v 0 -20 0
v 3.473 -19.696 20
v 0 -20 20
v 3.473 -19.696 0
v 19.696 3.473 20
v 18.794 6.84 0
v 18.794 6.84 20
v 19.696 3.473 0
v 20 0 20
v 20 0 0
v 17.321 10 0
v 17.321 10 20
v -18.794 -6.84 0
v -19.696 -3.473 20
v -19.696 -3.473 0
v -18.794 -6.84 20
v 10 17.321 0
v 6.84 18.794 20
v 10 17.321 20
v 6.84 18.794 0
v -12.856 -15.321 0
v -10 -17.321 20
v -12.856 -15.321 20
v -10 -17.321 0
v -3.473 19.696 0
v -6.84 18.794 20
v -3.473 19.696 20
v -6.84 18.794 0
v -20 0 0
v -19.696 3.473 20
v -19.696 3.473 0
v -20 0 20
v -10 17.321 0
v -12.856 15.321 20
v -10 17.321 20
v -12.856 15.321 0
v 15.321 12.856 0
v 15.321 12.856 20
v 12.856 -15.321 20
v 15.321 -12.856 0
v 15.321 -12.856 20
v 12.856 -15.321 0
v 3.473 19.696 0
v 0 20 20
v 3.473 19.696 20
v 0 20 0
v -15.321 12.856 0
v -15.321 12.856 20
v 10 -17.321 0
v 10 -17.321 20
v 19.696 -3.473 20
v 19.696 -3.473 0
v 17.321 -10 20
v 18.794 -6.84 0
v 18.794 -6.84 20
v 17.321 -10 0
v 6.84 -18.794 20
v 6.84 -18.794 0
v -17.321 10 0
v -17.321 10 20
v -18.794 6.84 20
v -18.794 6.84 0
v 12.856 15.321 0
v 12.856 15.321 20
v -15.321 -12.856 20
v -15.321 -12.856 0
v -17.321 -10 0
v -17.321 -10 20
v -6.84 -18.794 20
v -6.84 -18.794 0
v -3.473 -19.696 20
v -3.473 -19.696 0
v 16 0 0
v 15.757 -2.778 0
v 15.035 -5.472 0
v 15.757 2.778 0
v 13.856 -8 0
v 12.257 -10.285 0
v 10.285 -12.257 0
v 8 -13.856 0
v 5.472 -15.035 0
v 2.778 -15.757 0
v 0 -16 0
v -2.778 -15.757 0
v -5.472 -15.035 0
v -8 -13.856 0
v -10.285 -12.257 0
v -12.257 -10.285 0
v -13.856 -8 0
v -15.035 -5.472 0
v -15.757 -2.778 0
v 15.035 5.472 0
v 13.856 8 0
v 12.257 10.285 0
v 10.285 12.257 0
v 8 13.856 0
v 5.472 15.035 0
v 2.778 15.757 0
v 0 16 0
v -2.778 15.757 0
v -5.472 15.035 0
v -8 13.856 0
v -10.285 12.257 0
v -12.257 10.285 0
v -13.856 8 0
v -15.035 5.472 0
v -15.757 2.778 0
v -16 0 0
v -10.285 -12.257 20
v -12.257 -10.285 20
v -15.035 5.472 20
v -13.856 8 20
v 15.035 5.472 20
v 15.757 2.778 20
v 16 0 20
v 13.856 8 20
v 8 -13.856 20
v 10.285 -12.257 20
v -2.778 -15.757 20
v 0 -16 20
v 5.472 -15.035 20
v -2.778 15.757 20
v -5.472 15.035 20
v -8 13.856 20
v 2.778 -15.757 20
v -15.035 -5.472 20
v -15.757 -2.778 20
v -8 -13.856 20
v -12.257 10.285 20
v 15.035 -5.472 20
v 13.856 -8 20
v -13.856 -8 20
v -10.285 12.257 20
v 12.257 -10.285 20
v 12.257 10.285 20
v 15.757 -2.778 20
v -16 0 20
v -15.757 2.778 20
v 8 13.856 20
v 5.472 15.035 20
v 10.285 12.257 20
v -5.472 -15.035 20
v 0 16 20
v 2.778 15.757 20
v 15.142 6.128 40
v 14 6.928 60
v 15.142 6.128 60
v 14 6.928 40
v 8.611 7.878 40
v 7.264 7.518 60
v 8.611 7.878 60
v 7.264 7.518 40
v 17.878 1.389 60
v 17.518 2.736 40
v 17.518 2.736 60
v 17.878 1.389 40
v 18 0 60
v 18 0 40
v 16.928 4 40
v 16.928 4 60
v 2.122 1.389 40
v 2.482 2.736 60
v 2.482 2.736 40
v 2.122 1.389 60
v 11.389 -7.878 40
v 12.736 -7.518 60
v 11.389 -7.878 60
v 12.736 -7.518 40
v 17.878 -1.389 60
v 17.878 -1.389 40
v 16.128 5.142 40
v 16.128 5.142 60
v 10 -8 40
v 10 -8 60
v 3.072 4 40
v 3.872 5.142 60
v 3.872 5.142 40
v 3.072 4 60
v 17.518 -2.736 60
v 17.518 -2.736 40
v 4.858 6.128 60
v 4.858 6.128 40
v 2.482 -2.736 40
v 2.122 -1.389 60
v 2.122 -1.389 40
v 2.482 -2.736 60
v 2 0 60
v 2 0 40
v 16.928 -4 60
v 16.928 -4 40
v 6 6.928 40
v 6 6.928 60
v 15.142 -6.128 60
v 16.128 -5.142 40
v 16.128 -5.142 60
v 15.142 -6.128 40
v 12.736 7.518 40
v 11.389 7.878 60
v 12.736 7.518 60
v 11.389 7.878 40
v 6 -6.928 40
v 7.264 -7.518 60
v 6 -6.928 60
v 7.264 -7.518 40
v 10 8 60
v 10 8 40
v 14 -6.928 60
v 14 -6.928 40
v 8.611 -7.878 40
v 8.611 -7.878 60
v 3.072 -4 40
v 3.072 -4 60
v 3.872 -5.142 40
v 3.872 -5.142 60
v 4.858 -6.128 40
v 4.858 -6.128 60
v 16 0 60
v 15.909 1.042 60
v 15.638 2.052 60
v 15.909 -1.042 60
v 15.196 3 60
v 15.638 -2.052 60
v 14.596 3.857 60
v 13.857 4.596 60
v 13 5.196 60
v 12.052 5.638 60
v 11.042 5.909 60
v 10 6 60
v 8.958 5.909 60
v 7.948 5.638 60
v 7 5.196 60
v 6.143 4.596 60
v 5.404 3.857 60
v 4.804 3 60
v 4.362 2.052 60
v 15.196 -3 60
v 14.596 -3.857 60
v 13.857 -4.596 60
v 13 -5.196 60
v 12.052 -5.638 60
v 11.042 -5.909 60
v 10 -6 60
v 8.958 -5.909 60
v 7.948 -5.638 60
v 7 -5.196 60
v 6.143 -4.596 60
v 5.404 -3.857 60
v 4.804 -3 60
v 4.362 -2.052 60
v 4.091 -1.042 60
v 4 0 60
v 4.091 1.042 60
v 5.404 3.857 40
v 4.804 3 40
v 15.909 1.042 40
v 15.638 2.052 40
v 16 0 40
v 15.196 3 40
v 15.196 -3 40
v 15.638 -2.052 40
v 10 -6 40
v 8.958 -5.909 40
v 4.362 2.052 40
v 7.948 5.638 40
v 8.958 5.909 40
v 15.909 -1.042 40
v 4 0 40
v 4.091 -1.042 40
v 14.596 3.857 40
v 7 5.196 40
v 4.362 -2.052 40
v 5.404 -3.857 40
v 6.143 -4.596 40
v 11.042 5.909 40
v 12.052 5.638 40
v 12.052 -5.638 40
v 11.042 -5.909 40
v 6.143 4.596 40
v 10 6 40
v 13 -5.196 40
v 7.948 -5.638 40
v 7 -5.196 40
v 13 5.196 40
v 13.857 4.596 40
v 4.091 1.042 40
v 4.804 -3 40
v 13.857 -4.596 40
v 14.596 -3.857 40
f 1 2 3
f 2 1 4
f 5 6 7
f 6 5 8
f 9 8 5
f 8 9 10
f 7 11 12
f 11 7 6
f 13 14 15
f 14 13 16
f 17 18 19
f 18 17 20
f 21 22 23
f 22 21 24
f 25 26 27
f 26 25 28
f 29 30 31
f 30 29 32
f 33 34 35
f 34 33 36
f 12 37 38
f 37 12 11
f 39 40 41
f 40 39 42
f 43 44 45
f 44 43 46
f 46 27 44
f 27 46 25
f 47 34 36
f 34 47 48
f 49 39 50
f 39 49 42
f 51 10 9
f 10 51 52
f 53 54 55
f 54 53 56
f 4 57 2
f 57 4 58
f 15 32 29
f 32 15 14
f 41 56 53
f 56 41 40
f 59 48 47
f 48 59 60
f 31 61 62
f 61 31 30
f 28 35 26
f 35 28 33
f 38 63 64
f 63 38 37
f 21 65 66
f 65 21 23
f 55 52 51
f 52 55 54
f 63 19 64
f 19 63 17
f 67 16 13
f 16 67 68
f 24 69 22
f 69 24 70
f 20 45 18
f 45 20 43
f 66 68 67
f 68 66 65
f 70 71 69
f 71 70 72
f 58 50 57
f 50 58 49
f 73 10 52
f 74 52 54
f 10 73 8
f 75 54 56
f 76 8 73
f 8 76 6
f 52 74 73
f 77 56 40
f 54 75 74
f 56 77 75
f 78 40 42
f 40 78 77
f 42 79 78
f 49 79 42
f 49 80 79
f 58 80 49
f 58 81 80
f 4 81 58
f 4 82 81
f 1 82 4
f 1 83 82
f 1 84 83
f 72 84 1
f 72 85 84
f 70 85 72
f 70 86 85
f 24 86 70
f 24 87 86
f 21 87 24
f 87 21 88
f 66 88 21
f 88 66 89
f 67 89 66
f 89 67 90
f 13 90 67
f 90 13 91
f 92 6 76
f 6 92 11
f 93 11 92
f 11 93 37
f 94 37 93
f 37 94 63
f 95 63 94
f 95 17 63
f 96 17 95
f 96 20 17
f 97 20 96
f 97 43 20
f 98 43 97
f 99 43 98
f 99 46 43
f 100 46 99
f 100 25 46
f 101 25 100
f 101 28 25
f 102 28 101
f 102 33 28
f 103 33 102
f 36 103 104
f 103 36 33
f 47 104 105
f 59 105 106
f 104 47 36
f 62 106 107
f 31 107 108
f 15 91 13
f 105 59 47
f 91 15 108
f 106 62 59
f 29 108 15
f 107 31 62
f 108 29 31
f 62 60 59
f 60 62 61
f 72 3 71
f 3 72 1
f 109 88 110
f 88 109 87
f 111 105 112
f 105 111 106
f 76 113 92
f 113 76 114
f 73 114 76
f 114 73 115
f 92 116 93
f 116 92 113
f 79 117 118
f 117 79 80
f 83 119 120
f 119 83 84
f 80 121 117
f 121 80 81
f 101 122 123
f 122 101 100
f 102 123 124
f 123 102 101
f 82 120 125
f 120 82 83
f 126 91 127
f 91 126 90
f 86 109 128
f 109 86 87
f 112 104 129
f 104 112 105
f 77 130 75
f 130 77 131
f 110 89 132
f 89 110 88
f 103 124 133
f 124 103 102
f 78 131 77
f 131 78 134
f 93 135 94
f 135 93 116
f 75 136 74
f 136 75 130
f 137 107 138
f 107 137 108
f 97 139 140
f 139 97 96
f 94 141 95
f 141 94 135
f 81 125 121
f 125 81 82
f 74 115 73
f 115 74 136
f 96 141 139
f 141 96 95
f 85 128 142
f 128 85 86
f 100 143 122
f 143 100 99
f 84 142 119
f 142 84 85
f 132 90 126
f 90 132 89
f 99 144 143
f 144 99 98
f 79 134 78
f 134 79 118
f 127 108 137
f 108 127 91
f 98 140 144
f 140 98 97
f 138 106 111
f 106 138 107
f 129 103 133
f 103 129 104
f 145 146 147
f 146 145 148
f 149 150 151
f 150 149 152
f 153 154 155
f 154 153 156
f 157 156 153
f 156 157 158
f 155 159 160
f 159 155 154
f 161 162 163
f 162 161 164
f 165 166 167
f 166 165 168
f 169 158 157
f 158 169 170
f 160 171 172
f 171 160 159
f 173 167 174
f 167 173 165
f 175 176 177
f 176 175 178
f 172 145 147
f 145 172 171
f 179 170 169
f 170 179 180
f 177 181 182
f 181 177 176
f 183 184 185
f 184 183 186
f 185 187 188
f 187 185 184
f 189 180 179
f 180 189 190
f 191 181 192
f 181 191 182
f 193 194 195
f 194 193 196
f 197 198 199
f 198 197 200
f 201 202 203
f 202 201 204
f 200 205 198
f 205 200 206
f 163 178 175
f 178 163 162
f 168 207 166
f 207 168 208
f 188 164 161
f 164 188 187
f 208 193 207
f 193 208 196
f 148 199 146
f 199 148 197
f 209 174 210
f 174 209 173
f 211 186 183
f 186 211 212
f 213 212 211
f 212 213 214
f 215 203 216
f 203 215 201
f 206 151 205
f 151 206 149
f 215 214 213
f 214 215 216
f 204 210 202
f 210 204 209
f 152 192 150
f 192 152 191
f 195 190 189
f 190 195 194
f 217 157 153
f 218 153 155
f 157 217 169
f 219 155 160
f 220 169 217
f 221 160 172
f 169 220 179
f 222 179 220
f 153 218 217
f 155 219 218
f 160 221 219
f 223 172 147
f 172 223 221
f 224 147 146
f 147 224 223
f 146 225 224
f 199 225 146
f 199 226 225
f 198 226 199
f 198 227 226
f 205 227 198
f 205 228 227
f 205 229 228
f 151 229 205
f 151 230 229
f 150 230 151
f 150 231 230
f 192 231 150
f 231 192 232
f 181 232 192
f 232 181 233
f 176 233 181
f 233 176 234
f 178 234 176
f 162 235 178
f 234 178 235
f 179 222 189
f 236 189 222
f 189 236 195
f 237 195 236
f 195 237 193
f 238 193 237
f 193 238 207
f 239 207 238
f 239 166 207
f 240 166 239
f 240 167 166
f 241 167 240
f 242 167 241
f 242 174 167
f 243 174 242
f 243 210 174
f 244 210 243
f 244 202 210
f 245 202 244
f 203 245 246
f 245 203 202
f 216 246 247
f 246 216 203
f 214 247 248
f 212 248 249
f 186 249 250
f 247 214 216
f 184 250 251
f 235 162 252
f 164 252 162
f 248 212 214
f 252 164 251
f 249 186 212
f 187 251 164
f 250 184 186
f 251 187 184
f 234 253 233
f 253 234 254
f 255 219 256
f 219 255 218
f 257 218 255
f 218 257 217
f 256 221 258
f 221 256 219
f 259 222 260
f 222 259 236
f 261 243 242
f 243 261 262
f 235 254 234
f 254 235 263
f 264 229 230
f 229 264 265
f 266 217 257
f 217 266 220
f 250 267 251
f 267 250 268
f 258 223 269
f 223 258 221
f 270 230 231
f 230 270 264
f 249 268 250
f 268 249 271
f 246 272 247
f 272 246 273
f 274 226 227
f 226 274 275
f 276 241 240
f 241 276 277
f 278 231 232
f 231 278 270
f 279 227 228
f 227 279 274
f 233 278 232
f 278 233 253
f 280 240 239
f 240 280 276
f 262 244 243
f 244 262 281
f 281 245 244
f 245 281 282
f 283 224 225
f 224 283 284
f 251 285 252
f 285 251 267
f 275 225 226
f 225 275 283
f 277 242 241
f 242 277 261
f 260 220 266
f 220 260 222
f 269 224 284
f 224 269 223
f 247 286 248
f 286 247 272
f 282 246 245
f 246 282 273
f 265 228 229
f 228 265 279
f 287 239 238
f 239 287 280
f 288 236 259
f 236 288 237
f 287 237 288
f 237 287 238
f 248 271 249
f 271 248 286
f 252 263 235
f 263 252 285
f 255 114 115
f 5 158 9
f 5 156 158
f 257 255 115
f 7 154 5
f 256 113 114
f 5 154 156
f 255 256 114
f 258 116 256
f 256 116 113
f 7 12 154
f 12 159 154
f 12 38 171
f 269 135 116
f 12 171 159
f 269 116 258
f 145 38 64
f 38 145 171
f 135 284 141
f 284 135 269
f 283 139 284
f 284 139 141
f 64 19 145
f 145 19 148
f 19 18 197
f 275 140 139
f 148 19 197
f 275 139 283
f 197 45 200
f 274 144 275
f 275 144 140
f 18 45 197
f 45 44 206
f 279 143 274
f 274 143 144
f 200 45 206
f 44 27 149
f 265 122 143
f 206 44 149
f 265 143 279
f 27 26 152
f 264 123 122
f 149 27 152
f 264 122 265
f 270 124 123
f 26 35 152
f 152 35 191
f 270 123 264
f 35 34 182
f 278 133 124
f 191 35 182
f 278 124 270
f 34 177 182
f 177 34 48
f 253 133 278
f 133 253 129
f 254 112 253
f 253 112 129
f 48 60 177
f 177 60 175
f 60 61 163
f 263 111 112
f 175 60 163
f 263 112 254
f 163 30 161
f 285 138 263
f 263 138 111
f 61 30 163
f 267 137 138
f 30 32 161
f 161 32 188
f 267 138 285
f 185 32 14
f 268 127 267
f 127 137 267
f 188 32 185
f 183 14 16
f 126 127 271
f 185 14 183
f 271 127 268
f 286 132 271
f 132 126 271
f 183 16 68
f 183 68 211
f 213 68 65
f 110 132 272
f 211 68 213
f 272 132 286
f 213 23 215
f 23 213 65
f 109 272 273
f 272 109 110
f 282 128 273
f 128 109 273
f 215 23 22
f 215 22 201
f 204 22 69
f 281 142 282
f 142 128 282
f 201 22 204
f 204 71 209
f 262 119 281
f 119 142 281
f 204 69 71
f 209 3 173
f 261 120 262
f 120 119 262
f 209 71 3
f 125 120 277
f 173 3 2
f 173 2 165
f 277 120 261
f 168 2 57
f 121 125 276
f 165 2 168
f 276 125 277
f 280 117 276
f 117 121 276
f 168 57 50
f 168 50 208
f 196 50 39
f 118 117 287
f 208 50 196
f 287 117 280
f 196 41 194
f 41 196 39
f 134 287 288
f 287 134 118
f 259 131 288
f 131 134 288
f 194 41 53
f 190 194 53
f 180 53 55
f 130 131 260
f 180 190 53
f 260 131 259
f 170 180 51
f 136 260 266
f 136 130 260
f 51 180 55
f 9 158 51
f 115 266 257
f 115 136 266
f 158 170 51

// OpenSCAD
// eccentric pipe reducer
// by MisterC

// input parameters

/* lower pipe */
// lower pipe inner diameter
lower_diameter = 32; // min/max:[1:100]
// lower pipe height
lower_height = 20; // min/max:[1:100]
// lower pipe wall
lower_wall = 4; // min/max:[0.5:0.5:10]

/* transition piece */
// gap between lower and upper pipes
trans_height = 20; // min/max:[5:50]

// offset of reducer:
trans_angle = 0; // min/max:[0:360]
// angle (0=+X,90=+Y etc)
// ratio to cl
trans_ratio = 100; // min/max:[0:100]
// 0 ratio is concentric
// 100 ratio is wall parallel

// should inside walls run through?
in_parallel = true; // [true,false]
// true if inner wall would be parallel, false if outer

// resolution of reducer
segments = 36; //[36:Low, 90:Medium, 180:High]


/* upper pipe */
// upper pipe inner diameter
upper_diameter = 12; // min/max:[1:100]
// upper pipe height
upper_height = 20; // min/max:[1:100]
// upper pipe wall
upper_wall = 2; // min/max:[0.5:0.5:10]


// calculated values
/* [Hidden]*/
ang = 360 / segments; // degrees per segment
$fn = segments; // make the pipes as accurate as the transition
fudge = 1; // fudge for cuts

// heights
lower_btm = 0;
lower_top = lower_btm + lower_height;
upper_btm = lower_top + trans_height;
upper_top = upper_btm + upper_height;

// pipe radii
lower_in = lower_diameter / 2;
lower_out = lower_in + lower_wall;
upper_in = upper_diameter / 2;
upper_out = upper_in + upper_wall;

// if parallel_check is inners (in_parallel is true) then centre_offset is inners else outers
// using SCAD's conditional syntax
ctr_off = in_parallel
    ? (lower_in - upper_in)
    : (lower_out - upper_out);

// now work out where the upper pipe centre is
x_offset = cos(trans_angle) * ctr_off * trans_ratio / 100;
y_offset = sin(trans_angle) * ctr_off * trans_ratio / 100;


// modules and functions
// cos_fill & sin_fill create a list of x&y co-ordinates using a loop structure copied from Mathgrrl's snowflakerator sequence generators
function cos_fill(distance, switch)
    = [for(step=[0:segments])
        distance*cos(ang*step) + x_offset*switch];

function sin_fill(distance, switch)
    = [for(step=[0:segments])
        distance*sin(ang*step) + y_offset*switch];

// lots of co-ordinate calcs
lower_Ox=cos_fill(lower_out,0);
lower_Oy=sin_fill(lower_out,0);

upper_Ox=cos_fill(upper_out,1);
upper_Oy=sin_fill(upper_out,1);

lower_Ix=cos_fill(lower_in,0);
lower_Iy=sin_fill(lower_in,0);

upper_Ix=cos_fill(upper_in,1);
upper_Iy=sin_fill(upper_in,1);

// and now to business
color ("green")
difference()    // lower pipe
{
    translate([0,0,lower_btm])
        cylinder(r=lower_out, h=lower_height);
    translate([0,0,lower_btm-fudge])
        cylinder(r=lower_in, h=lower_height+(2*fudge));
}
color ("red")
difference()    // upper pipe
{
    translate([x_offset,y_offset,upper_btm])
        cylinder(r=upper_out, h=upper_height);
    translate([x_offset,y_offset,upper_btm-fudge])
        cylinder(r=upper_in, h=upper_height+(2*fudge));
}
// 'cubes' (really trapezoidal blocks) for reducer using polyhedron command as per OpenSCAD wiki example 1 by Bruno Bronosky
color ("blue")
for (step=[1:segments])
{
    polyhedron(points = [
        [lower_Ox[step-1],lower_Oy[step-1],lower_top],
        [lower_Ox[step],lower_Oy[step],lower_top],
        [lower_Ix[step],lower_Iy[step],lower_top],
        [lower_Ix[step-1],lower_Iy[step-1],lower_top],
        [upper_Ox[step-1],upper_Oy[step-1],upper_btm],
        [upper_Ox[step],upper_Oy[step],upper_btm],
        [upper_Ix[step],upper_Iy[step],upper_btm],
        [upper_Ix[step-1],upper_Iy[step-1],upper_btm]
        ], faces = [
        [0,1,2,3],[4,5,1,0],[7,6,5,4],
        [5,6,2,1],[6,7,3,2],[7,4,0,3]]);
}
